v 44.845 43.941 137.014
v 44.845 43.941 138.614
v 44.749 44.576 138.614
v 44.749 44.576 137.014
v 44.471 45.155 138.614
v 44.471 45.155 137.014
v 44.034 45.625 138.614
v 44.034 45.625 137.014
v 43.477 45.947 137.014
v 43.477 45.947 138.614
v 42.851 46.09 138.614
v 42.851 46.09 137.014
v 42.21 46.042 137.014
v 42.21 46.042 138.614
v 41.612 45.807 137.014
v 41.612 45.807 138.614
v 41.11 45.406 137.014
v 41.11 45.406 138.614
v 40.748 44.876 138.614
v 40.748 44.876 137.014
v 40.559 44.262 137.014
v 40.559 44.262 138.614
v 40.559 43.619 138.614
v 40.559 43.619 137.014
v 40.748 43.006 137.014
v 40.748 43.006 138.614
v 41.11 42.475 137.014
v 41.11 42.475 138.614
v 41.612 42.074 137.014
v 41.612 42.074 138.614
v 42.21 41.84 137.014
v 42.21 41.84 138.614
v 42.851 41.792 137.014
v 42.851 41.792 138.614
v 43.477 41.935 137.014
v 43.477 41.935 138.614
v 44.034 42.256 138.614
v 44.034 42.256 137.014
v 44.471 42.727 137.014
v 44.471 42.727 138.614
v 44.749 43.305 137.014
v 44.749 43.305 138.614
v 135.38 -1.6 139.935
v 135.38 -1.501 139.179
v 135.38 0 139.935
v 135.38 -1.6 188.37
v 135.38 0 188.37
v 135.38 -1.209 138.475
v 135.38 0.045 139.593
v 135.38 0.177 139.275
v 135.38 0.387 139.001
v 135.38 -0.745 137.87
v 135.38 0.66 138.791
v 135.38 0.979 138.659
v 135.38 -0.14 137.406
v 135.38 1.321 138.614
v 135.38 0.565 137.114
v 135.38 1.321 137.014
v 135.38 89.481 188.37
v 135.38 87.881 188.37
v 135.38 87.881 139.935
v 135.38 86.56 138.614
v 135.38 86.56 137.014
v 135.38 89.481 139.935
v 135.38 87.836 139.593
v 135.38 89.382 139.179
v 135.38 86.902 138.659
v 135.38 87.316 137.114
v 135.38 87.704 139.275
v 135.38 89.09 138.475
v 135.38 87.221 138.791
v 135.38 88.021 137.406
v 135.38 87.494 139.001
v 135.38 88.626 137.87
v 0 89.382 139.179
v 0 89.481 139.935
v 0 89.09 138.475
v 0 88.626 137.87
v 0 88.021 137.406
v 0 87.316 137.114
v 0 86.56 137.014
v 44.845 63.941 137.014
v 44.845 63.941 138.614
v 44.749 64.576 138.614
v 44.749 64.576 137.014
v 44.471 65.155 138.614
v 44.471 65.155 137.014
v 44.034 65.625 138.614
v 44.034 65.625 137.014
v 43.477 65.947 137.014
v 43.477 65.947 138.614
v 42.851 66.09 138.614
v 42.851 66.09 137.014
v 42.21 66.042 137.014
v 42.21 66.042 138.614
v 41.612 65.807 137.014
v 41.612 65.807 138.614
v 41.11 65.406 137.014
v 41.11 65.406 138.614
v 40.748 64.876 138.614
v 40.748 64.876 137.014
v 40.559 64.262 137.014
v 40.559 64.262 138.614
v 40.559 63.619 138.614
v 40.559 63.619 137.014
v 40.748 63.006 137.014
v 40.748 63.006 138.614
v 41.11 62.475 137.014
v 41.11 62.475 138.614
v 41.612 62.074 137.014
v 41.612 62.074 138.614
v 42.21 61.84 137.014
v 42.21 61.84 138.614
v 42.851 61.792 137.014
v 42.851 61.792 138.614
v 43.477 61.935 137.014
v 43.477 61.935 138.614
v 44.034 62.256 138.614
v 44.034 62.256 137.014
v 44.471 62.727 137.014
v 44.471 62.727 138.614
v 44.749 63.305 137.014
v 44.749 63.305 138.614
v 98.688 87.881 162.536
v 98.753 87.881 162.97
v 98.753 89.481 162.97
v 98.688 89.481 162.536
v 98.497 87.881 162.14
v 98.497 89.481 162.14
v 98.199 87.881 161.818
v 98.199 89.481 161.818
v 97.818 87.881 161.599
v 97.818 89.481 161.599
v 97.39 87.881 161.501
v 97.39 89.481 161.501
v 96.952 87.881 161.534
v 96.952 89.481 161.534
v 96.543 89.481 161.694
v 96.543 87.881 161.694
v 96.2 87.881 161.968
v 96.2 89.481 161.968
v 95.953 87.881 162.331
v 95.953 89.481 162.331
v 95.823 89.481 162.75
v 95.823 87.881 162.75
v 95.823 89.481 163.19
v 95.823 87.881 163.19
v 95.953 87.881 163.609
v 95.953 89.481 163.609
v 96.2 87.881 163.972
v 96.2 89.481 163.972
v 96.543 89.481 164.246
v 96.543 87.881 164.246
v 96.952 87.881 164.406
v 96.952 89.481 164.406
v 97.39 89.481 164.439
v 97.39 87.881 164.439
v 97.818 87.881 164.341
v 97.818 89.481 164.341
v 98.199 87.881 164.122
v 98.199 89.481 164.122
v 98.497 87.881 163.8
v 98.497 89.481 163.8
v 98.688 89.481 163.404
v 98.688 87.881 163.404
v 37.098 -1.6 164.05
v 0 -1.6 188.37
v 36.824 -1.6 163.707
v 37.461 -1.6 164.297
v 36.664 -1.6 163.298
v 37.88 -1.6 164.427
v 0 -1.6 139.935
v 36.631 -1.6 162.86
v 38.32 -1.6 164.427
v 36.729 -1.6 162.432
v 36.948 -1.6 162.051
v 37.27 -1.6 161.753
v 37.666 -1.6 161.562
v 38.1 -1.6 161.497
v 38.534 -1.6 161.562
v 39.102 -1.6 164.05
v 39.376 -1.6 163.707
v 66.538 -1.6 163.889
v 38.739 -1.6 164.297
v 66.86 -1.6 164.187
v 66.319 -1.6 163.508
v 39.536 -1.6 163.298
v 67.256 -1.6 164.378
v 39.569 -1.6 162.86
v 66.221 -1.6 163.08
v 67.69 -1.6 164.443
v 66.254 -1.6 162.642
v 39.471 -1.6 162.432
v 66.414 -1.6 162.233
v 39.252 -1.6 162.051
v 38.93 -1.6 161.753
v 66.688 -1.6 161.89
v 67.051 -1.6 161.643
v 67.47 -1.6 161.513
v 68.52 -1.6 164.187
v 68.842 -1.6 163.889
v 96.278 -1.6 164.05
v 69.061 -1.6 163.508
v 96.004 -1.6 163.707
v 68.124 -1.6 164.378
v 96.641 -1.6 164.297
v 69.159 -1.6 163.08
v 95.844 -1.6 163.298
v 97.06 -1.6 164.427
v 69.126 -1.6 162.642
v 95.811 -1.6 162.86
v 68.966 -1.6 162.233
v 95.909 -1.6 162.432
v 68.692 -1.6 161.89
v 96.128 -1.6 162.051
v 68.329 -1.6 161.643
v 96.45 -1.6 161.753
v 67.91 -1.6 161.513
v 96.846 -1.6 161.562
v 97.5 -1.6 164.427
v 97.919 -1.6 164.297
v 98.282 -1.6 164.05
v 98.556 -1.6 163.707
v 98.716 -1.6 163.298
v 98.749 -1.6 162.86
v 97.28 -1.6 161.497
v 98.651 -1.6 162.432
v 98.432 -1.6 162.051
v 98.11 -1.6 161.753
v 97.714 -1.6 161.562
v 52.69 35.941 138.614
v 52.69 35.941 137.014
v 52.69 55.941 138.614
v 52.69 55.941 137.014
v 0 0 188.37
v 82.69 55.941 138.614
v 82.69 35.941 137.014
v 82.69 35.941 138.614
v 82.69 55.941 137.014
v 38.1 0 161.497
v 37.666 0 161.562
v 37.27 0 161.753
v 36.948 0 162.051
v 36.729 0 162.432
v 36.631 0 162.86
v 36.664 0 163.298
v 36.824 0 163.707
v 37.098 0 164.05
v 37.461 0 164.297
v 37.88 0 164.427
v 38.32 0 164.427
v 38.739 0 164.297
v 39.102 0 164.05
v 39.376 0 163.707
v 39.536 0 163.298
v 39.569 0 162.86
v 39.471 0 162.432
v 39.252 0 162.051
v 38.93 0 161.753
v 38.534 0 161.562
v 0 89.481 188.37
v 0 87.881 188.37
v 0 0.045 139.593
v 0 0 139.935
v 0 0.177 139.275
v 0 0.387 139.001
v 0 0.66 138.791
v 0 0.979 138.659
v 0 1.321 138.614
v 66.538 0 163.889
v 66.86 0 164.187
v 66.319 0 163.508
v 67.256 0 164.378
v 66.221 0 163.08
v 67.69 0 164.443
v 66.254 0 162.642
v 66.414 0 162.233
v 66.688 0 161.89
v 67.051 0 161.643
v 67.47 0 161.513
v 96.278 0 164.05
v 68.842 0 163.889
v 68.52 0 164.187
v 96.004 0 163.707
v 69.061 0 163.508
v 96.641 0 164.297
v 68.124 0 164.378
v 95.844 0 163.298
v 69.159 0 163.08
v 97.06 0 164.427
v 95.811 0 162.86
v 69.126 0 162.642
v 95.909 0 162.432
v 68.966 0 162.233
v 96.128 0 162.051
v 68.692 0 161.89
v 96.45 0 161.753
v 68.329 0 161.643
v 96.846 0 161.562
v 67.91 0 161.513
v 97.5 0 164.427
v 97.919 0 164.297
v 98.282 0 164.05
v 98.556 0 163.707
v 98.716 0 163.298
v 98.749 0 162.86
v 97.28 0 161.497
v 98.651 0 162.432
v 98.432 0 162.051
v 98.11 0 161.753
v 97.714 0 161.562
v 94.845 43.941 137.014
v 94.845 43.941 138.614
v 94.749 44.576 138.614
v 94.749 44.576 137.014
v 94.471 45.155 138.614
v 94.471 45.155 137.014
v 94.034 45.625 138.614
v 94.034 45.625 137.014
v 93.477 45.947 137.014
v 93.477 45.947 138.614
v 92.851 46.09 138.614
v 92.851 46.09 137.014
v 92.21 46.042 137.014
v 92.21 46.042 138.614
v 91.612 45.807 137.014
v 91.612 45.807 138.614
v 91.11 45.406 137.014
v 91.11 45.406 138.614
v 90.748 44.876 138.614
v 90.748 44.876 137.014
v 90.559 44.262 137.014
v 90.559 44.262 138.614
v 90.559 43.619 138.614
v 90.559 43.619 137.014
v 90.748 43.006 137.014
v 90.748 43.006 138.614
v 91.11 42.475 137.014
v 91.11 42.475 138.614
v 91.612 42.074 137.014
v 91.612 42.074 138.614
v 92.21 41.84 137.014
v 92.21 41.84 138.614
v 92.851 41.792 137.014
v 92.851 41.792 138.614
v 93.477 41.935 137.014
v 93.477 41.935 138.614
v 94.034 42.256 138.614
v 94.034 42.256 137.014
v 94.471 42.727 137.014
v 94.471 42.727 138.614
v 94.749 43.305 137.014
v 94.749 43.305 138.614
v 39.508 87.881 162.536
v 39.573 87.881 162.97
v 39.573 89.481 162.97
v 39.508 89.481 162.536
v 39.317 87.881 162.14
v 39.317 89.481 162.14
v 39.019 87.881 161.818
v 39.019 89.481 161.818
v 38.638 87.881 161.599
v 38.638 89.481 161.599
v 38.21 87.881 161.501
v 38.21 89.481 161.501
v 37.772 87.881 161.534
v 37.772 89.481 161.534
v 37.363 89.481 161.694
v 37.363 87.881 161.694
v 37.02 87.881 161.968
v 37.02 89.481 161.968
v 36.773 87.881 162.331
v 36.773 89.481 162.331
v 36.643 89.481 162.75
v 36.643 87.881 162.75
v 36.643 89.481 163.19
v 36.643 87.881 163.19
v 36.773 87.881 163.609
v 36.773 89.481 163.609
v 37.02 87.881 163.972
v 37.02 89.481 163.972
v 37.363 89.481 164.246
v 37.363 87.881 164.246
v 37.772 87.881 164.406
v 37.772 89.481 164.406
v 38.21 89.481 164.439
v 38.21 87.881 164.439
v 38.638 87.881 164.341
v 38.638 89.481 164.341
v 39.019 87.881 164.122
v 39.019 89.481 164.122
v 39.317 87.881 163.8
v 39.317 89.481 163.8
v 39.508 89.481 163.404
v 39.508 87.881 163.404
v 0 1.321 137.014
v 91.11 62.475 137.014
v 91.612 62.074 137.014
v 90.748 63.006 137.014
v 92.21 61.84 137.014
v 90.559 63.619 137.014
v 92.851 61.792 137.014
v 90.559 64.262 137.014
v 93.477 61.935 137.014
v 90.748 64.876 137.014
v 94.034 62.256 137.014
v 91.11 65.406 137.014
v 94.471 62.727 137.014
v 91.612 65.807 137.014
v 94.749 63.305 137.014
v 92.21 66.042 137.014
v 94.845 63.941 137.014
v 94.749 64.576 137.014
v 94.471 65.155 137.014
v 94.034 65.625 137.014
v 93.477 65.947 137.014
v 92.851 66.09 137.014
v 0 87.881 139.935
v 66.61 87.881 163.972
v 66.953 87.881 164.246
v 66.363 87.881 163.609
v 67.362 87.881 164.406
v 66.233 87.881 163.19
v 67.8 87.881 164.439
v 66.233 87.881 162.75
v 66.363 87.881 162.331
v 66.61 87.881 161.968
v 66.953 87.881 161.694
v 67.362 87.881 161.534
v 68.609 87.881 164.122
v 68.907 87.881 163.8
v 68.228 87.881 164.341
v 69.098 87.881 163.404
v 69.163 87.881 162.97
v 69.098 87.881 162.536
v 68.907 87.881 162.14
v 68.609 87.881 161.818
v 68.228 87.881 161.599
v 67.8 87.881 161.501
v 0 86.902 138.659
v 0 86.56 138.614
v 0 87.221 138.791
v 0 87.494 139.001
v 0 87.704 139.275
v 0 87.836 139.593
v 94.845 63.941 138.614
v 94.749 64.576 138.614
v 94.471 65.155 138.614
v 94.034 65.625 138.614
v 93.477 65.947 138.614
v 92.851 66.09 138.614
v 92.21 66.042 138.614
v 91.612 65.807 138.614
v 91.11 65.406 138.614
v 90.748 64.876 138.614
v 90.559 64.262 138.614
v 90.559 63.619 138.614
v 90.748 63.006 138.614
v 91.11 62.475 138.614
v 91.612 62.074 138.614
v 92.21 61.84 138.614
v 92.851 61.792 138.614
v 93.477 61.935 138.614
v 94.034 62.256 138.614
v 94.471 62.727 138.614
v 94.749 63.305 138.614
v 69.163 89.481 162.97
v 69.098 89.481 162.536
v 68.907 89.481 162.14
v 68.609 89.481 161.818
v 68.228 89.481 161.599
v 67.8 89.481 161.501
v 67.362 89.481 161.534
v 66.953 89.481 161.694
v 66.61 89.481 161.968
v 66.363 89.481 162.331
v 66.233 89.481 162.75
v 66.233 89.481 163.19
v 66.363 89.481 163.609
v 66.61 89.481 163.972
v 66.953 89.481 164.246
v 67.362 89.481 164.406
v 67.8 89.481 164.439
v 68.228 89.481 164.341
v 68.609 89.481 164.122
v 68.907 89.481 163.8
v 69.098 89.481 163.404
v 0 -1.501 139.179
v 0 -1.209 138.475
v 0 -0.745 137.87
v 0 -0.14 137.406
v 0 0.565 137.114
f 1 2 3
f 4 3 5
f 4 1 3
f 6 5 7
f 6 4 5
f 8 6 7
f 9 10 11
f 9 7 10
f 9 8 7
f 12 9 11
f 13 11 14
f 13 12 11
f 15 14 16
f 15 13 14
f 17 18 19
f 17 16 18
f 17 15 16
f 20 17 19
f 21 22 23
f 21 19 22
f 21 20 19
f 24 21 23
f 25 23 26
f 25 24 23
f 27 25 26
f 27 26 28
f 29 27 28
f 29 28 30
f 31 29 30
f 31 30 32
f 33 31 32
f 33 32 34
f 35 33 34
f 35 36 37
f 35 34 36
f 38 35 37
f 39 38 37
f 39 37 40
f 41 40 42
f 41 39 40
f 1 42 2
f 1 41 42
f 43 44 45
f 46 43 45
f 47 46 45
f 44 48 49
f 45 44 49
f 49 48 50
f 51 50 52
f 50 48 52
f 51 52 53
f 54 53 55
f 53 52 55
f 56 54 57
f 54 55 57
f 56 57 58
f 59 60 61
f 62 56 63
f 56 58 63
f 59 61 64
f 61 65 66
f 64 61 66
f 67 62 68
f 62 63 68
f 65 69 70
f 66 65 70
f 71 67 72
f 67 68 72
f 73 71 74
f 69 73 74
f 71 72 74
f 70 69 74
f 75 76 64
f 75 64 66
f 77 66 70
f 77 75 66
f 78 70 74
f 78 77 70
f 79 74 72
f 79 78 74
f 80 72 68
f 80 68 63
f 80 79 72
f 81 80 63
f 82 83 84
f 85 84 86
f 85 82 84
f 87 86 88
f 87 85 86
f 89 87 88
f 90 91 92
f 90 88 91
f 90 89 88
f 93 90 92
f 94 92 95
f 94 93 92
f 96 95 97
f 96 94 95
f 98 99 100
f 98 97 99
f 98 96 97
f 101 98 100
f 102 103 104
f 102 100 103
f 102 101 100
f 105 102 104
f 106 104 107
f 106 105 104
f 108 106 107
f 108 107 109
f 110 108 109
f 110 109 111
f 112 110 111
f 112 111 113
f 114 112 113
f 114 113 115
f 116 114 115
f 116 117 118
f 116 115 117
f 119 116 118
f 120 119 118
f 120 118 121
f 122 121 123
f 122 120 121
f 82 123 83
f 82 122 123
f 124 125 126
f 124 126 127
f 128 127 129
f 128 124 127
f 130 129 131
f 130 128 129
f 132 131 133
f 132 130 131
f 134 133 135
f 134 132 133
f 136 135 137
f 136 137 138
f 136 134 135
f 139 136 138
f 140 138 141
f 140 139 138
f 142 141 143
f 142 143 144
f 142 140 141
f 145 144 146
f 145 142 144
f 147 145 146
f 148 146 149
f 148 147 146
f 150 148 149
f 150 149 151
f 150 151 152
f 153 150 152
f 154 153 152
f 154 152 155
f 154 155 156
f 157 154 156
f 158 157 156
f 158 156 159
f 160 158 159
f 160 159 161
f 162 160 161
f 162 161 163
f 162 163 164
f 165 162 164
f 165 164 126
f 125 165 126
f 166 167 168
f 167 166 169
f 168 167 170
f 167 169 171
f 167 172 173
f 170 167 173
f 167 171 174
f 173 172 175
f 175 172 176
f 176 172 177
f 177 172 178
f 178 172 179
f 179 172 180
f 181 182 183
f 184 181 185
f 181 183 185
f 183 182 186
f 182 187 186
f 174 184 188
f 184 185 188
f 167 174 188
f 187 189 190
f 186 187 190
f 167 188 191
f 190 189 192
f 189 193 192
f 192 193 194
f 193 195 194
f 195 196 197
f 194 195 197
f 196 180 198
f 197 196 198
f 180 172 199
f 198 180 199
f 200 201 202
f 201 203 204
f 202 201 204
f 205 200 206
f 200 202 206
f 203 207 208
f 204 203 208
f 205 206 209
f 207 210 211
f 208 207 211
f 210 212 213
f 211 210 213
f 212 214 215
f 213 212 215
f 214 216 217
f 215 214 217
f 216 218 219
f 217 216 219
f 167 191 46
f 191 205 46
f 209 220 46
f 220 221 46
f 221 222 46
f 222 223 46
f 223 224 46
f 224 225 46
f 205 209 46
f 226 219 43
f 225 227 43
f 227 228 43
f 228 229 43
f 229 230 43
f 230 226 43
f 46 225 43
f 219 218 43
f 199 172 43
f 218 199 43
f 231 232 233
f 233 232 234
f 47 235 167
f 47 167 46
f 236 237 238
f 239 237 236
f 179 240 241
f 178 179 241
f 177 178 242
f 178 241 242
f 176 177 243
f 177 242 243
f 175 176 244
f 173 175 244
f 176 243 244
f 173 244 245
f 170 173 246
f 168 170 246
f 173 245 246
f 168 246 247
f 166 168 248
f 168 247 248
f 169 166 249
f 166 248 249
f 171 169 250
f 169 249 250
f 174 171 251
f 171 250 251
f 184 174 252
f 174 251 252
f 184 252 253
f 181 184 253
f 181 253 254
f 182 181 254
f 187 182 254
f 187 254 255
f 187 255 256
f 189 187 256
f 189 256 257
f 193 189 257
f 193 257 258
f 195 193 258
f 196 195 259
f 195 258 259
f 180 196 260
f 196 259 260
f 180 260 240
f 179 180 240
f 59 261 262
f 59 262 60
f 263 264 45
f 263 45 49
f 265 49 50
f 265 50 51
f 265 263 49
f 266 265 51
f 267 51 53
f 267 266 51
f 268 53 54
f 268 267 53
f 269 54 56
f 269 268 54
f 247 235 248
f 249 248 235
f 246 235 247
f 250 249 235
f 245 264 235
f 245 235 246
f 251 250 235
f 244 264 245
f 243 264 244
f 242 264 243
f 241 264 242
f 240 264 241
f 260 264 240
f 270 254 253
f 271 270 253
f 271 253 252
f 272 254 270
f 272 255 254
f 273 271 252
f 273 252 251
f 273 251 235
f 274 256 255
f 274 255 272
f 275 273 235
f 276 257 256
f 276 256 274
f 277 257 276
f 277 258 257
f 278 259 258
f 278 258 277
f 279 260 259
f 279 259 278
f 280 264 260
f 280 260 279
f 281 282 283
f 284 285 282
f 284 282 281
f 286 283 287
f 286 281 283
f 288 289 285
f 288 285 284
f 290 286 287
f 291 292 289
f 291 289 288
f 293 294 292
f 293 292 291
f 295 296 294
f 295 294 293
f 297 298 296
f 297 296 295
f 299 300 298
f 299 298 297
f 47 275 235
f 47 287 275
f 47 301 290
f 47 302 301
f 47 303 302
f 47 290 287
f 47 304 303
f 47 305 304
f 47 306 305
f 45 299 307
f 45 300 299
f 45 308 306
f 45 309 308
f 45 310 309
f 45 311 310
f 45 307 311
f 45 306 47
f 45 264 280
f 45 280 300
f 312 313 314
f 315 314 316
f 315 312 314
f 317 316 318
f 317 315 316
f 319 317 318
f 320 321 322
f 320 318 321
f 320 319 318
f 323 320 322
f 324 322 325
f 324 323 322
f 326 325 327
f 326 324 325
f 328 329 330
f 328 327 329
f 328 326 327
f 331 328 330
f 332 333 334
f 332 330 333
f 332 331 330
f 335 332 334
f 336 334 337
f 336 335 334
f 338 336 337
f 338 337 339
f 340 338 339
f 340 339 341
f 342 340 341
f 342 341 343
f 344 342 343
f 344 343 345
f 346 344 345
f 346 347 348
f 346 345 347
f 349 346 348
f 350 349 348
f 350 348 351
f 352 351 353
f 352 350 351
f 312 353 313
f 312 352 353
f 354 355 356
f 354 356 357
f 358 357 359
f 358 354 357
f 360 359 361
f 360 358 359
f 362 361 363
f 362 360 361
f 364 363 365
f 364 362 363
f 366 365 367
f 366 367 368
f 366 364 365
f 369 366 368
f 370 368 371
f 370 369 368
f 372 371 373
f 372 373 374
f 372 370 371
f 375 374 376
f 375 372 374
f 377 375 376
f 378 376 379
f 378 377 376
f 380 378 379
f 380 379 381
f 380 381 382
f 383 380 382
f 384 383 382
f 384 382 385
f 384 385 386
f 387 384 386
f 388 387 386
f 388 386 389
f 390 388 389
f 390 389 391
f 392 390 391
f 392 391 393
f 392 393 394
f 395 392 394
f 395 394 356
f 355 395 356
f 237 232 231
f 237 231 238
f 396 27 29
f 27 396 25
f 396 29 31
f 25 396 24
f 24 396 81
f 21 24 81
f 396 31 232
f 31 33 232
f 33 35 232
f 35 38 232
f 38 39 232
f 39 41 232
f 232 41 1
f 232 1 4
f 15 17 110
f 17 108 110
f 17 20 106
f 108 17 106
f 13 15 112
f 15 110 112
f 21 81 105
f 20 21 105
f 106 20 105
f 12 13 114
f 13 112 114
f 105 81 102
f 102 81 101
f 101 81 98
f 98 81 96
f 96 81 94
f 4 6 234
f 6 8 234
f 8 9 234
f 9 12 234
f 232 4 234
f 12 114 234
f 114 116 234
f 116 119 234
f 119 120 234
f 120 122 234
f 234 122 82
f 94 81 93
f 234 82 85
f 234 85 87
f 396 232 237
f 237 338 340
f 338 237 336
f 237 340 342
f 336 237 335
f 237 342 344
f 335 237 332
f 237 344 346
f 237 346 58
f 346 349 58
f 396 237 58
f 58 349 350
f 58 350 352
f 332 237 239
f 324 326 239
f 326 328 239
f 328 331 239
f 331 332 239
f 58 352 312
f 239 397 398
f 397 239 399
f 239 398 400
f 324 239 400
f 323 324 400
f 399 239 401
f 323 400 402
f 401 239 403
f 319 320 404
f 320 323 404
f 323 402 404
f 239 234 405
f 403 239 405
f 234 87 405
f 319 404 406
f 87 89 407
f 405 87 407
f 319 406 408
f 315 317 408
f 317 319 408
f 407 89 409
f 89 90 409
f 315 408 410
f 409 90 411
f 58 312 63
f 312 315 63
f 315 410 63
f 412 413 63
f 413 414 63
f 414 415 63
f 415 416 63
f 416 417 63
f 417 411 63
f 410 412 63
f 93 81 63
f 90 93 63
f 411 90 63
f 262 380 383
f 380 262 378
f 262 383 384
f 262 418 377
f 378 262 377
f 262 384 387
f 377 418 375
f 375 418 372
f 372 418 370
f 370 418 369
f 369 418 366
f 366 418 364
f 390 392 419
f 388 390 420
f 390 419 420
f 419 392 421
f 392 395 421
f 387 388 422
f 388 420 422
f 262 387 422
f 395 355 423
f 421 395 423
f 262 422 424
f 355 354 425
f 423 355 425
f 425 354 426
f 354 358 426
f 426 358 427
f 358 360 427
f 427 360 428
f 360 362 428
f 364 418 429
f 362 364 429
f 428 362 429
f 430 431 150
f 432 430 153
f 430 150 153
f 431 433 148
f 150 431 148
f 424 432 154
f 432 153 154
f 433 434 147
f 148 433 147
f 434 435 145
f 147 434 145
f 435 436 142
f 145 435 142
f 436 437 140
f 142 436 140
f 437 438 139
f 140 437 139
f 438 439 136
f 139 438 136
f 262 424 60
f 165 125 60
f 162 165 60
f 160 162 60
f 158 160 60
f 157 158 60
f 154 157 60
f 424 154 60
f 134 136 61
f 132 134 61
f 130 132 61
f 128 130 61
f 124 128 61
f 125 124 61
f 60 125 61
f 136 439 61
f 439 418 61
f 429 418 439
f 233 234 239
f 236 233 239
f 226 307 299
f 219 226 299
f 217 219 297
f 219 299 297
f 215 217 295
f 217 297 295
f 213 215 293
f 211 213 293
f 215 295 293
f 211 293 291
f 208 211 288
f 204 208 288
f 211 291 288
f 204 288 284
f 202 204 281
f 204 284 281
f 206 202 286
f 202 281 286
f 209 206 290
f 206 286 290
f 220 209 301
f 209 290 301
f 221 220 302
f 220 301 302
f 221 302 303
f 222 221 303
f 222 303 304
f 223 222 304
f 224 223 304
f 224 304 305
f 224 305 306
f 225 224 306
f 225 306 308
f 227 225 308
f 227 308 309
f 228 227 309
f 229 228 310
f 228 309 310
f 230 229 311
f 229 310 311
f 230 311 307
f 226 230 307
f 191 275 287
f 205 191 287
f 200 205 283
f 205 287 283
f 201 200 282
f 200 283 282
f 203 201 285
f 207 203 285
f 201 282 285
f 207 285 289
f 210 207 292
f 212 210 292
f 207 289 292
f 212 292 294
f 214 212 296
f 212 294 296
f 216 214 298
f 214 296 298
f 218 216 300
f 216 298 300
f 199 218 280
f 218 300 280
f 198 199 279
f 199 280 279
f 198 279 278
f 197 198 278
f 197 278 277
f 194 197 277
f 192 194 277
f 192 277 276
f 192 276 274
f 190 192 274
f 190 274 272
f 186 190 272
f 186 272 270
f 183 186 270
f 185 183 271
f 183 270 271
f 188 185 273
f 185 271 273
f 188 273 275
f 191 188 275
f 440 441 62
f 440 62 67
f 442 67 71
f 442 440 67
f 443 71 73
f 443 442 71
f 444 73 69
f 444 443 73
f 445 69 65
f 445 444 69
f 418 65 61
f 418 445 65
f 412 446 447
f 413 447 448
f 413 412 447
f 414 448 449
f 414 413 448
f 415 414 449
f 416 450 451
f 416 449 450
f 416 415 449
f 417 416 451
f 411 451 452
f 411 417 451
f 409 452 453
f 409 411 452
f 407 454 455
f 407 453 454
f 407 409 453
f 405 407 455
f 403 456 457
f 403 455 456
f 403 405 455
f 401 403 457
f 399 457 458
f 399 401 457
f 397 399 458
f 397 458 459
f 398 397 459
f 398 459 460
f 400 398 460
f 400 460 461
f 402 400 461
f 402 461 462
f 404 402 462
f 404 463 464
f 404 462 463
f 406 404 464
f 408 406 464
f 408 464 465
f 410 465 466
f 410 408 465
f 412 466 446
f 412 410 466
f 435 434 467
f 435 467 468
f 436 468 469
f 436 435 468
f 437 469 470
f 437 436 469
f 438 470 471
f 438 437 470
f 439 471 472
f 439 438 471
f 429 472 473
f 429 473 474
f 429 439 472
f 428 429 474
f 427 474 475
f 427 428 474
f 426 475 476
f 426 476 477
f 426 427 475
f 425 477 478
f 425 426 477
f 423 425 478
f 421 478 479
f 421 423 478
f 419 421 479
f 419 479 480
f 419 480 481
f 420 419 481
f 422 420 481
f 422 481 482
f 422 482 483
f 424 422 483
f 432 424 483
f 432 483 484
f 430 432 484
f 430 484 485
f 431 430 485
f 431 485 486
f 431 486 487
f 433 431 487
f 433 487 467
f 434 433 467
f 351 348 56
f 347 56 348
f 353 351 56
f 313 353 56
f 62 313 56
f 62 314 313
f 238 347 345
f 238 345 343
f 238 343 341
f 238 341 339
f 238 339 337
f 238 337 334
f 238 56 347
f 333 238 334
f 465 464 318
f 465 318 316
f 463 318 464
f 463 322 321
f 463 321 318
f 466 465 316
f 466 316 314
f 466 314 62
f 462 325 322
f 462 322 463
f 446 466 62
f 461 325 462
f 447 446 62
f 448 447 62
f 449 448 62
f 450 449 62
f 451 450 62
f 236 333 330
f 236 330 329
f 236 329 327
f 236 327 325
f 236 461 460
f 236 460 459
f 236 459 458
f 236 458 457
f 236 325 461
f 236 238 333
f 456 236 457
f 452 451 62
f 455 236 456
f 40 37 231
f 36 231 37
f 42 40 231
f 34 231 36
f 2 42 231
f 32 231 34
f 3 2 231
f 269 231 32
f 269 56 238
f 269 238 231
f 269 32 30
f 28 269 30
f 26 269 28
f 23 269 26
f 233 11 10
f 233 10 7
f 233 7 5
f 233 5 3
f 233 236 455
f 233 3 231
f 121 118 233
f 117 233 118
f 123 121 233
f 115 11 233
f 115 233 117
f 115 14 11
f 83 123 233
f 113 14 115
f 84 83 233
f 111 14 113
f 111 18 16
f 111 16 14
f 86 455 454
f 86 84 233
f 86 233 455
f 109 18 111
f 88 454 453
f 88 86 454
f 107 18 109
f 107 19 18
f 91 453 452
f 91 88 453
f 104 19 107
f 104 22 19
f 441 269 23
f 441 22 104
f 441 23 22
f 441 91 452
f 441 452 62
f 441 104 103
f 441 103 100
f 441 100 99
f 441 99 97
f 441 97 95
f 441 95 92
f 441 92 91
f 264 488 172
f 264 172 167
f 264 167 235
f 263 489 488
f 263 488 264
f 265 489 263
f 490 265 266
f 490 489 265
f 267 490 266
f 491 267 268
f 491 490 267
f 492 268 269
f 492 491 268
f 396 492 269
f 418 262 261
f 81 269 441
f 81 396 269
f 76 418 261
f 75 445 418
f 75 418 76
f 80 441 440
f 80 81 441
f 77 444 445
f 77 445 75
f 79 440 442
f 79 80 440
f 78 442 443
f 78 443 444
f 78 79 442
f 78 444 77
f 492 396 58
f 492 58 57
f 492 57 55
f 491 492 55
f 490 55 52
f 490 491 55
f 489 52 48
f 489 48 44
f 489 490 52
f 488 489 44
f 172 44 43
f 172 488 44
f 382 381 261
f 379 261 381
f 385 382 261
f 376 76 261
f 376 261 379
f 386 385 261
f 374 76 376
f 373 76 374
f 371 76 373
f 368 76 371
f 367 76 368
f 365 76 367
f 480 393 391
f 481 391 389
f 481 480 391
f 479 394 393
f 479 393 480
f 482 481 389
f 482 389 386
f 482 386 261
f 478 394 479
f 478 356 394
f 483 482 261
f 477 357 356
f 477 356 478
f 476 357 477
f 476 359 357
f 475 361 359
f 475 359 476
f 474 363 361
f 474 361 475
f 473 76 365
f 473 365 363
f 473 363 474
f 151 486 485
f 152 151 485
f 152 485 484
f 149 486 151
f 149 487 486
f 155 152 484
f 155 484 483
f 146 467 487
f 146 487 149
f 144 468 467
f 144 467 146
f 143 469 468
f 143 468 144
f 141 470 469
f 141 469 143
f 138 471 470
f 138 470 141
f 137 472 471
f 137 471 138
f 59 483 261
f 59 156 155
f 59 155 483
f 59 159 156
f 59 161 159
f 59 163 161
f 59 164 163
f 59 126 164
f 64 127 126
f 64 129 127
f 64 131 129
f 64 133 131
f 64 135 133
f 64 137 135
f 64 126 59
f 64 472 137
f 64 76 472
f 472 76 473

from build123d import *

# Parameters (mm, degrees)
SKETCH1_W                    = 135.38
SKETCH1_H                    = 188.37
SKETCH1_R                    = 1.4732
SKETCH1_R_2                  = 2.155
SKETCH1_W_2                  = 30
SKETCH1_H_2                  = 20
BASE_FLANGE1_DEPTH           = 1.6002
SKETCHED_BEND1_OUTLINE_W     = 135.38
SKETCHED_BEND1_OUTLINE_H     = 1.6002
SKETCHED_BEND1_DEPTH         = 137.314310973
SKETCHED_START               = 164.4432001
SKETCHED_BEND1_2_OUTLINE_W   = 135.38
SKETCHED_BEND1_2_OUTLINE_H   = 1.6002
SKETCHED_BEND1_2_DEPTH       = 23.9267999
SKETCHED_START_2             = 139.935207433
SKETCHED_BEND1_3_OUTLINE_W   = 135.38
SKETCHED_BEND1_3_OUTLINE_H   = 1.6002
SKETCHED_BEND1_3_DEPTH       = 21.561592467
SKETCHED_START_3             = 138.466703893
SKETCHED_BEND1_4_OUTLINE_W   = 135.38
SKETCHED_BEND1_4_OUTLINE_H   = 87.881185133
SKETCHED_BEND1_4_OUTLINE_R   = 2.155
SKETCHED_BEND1_4_OUTLINE_W_2 = 30
SKETCHED_BEND1_4_OUTLINE_H_2 = 20
SKETCHED_BEND1_4_DEPTH       = 0.14770354
SKETCHED_START_4             = 137.014207433
SKETCHED_BEND1_5_OUTLINE_W   = 135.38
SKETCHED_BEND1_5_OUTLINE_H   = 87.881185133
SKETCHED_BEND1_5_OUTLINE_R   = 2.155
SKETCHED_BEND1_5_OUTLINE_W_2 = 30
SKETCHED_BEND1_5_OUTLINE_H_2 = 20
SKETCHED_BEND1_5_DEPTH       = 2.921
SKETCHED_START_5             = 137.314310973
SKETCHED_BEND1_6_OUTLINE_W   = 135.38
SKETCHED_BEND1_6_OUTLINE_H   = 1.6002
SKETCHED_BEND1_6_DEPTH       = 27.128889127
SKETCHED_BEND1_7_DEPTH       = 135.38
SKETCHED_START_6             = 87
SKETCHED_BEND1_8_OUTLINE_R   = 1.4732
SKETCHED_BEND1_8_DEPTH       = 2.481385133


with BuildPart() as part:
    # Base-Flange1: sheet metal written as solids
    # Sketch1 → Base-Flange1 (new body)
    with BuildSketch(Plane(origin=(0, 0, 0), x_dir=(1, 0, 0), z_dir=(0, 1, 0))):
        with Locations((67.69, -94.185)):
            Rectangle(SKETCH1_W, SKETCH1_H)
        with Locations(Location((38.1, -25.4, 0), (0, 0, 270))):
            Circle(SKETCH1_R, mode=Mode.SUBTRACT)
        with Locations(Location((97.28, -25.4, 0), (0, 0, 270))):
            Circle(SKETCH1_R, mode=Mode.SUBTRACT)
        with Locations(Location((97.28, -162.97, 0), (0, 0, 90))):
            Circle(SKETCH1_R, mode=Mode.SUBTRACT)
        with Locations(Location((38.1, -162.97, 0), (0, 0, 90))):
            Circle(SKETCH1_R, mode=Mode.SUBTRACT)
        with Locations(Location((67.69, -25.4, 0), (0, 0, 270))):
            Circle(SKETCH1_R, mode=Mode.SUBTRACT)
        with Locations(Location((67.69, -162.97, 0), (0, 0, 270))):
            Circle(SKETCH1_R, mode=Mode.SUBTRACT)
        with Locations(Location((42.69, -94.185, 0), (0, 0, 270))):
            Circle(SKETCH1_R_2, mode=Mode.SUBTRACT)
        with Locations(Location((92.69, -94.185, 0), (0, 0, 270))):
            Circle(SKETCH1_R_2, mode=Mode.SUBTRACT)
        with Locations(Location((42.69, -74.185, 0), (0, 0, 270))):
            Circle(SKETCH1_R_2, mode=Mode.SUBTRACT)
        with Locations(Location((92.69, -74.185, 0), (0, 0, 270))):
            Circle(SKETCH1_R_2, mode=Mode.SUBTRACT)
        with Locations((67.69, -92.185)):
            Rectangle(SKETCH1_W_2, SKETCH1_H_2, mode=Mode.SUBTRACT)
    extrude(amount=-BASE_FLANGE1_DEPTH)

    # Sketched Bend1: read off the stored shape, not the designer's step
    # Sketched Bend1 outline → Sketched Bend1 (cut)
    with BuildSketch(Plane.XY):
        with Locations((67.69, -0.8001)):
            Rectangle(SKETCHED_BEND1_OUTLINE_W, SKETCHED_BEND1_OUTLINE_H)
    extrude(amount=SKETCHED_BEND1_DEPTH, mode=Mode.SUBTRACT)

    # Sketched Bend1 4 outline → Sketched Bend1 4 (add)
    with BuildSketch(Plane.XY.offset(SKETCHED_START_3)):
        with Locations((67.69, 43.940592567)):
            Rectangle(SKETCHED_BEND1_4_OUTLINE_W, SKETCHED_BEND1_4_OUTLINE_H)
        with Locations((42.69, 43.940592567)):
            Circle(SKETCHED_BEND1_4_OUTLINE_R, mode=Mode.SUBTRACT)
        with Locations((42.69, 63.940592567)):
            Circle(SKETCHED_BEND1_4_OUTLINE_R, mode=Mode.SUBTRACT)
        with Locations((67.69, 45.940592567)):
            Rectangle(SKETCHED_BEND1_4_OUTLINE_W_2, SKETCHED_BEND1_4_OUTLINE_H_2, mode=Mode.SUBTRACT)
        with Locations((92.69, 43.940592567)):
            Circle(SKETCHED_BEND1_4_OUTLINE_R, mode=Mode.SUBTRACT)
        with Locations((92.69, 63.940592567)):
            Circle(SKETCHED_BEND1_4_OUTLINE_R, mode=Mode.SUBTRACT)
    extrude(amount=SKETCHED_BEND1_4_DEPTH)



with BuildPart() as body_2:
    # Sketched Bend1 2 outline → Sketched Bend1 2 (new body)
    with BuildSketch(Plane.XY.offset(SKETCHED_START)):
        with Locations((67.69, 88.681285133)):
            Rectangle(SKETCHED_BEND1_2_OUTLINE_W, SKETCHED_BEND1_2_OUTLINE_H)
    extrude(amount=SKETCHED_BEND1_2_DEPTH)


with BuildPart() as body_3:
    # Sketched Bend1 3 outline → Sketched Bend1 3 (new body)
    with BuildSketch(Plane.XY.offset(SKETCHED_START_2)):
        with Locations((67.69, 88.681285133)):
            Rectangle(SKETCHED_BEND1_3_OUTLINE_W, SKETCHED_BEND1_3_OUTLINE_H)
    extrude(amount=SKETCHED_BEND1_3_DEPTH)


with BuildPart() as part_1:
    add(part.part)

    add(body_3.part)  # Sketched Bend1 5 merges body 3
    # Sketched Bend1 5 outline → Sketched Bend1 5 (add)
    with BuildSketch(Plane.XY.offset(SKETCHED_START_4)):
        with Locations((67.69, 43.940592567)):
            Rectangle(SKETCHED_BEND1_5_OUTLINE_W, SKETCHED_BEND1_5_OUTLINE_H)
        with Locations((42.69, 43.940592567)):
            Circle(SKETCHED_BEND1_5_OUTLINE_R, mode=Mode.SUBTRACT)
        with Locations((92.69, 43.940592567)):
            Circle(SKETCHED_BEND1_5_OUTLINE_R, mode=Mode.SUBTRACT)
        with Locations((42.69, 63.940592567)):
            Circle(SKETCHED_BEND1_5_OUTLINE_R, mode=Mode.SUBTRACT)
        with Locations((67.69, 45.940592567)):
            Rectangle(SKETCHED_BEND1_5_OUTLINE_W_2, SKETCHED_BEND1_5_OUTLINE_H_2, mode=Mode.SUBTRACT)
        with Locations((92.69, 63.940592567)):
            Circle(SKETCHED_BEND1_5_OUTLINE_R, mode=Mode.SUBTRACT)
    extrude(amount=SKETCHED_BEND1_5_DEPTH)


    add(body_2.part)  # Sketched Bend1 6 merges body 2
    # Sketched Bend1 6 outline → Sketched Bend1 6 (add)
    with BuildSketch(Plane.XY.offset(SKETCHED_START_5)):
        with Locations((67.69, 88.681285133)):
            Rectangle(SKETCHED_BEND1_6_OUTLINE_W, SKETCHED_BEND1_6_OUTLINE_H)
    extrude(amount=SKETCHED_BEND1_6_DEPTH)

    # Sketched Bend1 7 outline → Sketched Bend1 7 (cut)
    with BuildSketch(Plane.YZ):
        with BuildLine():
            ThreePointArc((89.481385133, 139.935207433), (88.62584404, 137.869748526), (86.560385133, 137.014207433))
            Line((86.560385133, 137.014207433), (87.881185133, 137.014207433))
            Line((87.881185133, 137.014207433), (87.881185133, 137.314310973))
            Line((87.881185133, 137.314310973), (89.481385133, 137.314310973))
            Line((89.481385133, 137.314310973), (89.481385133, 139.935207433))
        make_face()
        with BuildLine():
            Line((0, 137.014207433), (1.3208, 137.014207433))
            ThreePointArc((1.3208, 137.014207433), (-0.744658907, 137.869748526), (-1.6002, 139.935207433))
            Line((-1.6002, 139.935207433), (-1.6002, 137.314310973))
            Line((-1.6002, 137.314310973), (0, 137.314310973))
            Line((0, 137.314310973), (0, 137.014207433))
        make_face()
        with BuildLine():
            ThreePointArc((86.560385133, 138.614407433), (87.49433177, 139.001260796), (87.881185133, 139.935207433))
            Line((87.881185133, 139.935207433), (0, 139.935207433))
            ThreePointArc((0, 139.935207433), (0.386853363, 139.001260796), (1.3208, 138.614407433))
            Line((1.3208, 138.614407433), (86.560385133, 138.614407433))
        make_face()
    extrude(amount=SKETCHED_BEND1_7_DEPTH, mode=Mode.SUBTRACT)

    # Sketched Bend1 8 outline → Sketched Bend1 8 (cut)
    with BuildSketch(Plane(origin=(0, 0, 0), x_dir=(1, 0, 0), z_dir=(0, 1, 0)).offset(SKETCHED_START_6)):
        with Locations((67.69, -162.97)):
            Circle(SKETCHED_BEND1_8_OUTLINE_R)
        with Locations((97.28, -162.97)):
            Circle(SKETCHED_BEND1_8_OUTLINE_R)
        with Locations((38.1, -162.97)):
            Circle(SKETCHED_BEND1_8_OUTLINE_R)
    extrude(amount=SKETCHED_BEND1_8_DEPTH, mode=Mode.SUBTRACT)


solid = part_1.part
